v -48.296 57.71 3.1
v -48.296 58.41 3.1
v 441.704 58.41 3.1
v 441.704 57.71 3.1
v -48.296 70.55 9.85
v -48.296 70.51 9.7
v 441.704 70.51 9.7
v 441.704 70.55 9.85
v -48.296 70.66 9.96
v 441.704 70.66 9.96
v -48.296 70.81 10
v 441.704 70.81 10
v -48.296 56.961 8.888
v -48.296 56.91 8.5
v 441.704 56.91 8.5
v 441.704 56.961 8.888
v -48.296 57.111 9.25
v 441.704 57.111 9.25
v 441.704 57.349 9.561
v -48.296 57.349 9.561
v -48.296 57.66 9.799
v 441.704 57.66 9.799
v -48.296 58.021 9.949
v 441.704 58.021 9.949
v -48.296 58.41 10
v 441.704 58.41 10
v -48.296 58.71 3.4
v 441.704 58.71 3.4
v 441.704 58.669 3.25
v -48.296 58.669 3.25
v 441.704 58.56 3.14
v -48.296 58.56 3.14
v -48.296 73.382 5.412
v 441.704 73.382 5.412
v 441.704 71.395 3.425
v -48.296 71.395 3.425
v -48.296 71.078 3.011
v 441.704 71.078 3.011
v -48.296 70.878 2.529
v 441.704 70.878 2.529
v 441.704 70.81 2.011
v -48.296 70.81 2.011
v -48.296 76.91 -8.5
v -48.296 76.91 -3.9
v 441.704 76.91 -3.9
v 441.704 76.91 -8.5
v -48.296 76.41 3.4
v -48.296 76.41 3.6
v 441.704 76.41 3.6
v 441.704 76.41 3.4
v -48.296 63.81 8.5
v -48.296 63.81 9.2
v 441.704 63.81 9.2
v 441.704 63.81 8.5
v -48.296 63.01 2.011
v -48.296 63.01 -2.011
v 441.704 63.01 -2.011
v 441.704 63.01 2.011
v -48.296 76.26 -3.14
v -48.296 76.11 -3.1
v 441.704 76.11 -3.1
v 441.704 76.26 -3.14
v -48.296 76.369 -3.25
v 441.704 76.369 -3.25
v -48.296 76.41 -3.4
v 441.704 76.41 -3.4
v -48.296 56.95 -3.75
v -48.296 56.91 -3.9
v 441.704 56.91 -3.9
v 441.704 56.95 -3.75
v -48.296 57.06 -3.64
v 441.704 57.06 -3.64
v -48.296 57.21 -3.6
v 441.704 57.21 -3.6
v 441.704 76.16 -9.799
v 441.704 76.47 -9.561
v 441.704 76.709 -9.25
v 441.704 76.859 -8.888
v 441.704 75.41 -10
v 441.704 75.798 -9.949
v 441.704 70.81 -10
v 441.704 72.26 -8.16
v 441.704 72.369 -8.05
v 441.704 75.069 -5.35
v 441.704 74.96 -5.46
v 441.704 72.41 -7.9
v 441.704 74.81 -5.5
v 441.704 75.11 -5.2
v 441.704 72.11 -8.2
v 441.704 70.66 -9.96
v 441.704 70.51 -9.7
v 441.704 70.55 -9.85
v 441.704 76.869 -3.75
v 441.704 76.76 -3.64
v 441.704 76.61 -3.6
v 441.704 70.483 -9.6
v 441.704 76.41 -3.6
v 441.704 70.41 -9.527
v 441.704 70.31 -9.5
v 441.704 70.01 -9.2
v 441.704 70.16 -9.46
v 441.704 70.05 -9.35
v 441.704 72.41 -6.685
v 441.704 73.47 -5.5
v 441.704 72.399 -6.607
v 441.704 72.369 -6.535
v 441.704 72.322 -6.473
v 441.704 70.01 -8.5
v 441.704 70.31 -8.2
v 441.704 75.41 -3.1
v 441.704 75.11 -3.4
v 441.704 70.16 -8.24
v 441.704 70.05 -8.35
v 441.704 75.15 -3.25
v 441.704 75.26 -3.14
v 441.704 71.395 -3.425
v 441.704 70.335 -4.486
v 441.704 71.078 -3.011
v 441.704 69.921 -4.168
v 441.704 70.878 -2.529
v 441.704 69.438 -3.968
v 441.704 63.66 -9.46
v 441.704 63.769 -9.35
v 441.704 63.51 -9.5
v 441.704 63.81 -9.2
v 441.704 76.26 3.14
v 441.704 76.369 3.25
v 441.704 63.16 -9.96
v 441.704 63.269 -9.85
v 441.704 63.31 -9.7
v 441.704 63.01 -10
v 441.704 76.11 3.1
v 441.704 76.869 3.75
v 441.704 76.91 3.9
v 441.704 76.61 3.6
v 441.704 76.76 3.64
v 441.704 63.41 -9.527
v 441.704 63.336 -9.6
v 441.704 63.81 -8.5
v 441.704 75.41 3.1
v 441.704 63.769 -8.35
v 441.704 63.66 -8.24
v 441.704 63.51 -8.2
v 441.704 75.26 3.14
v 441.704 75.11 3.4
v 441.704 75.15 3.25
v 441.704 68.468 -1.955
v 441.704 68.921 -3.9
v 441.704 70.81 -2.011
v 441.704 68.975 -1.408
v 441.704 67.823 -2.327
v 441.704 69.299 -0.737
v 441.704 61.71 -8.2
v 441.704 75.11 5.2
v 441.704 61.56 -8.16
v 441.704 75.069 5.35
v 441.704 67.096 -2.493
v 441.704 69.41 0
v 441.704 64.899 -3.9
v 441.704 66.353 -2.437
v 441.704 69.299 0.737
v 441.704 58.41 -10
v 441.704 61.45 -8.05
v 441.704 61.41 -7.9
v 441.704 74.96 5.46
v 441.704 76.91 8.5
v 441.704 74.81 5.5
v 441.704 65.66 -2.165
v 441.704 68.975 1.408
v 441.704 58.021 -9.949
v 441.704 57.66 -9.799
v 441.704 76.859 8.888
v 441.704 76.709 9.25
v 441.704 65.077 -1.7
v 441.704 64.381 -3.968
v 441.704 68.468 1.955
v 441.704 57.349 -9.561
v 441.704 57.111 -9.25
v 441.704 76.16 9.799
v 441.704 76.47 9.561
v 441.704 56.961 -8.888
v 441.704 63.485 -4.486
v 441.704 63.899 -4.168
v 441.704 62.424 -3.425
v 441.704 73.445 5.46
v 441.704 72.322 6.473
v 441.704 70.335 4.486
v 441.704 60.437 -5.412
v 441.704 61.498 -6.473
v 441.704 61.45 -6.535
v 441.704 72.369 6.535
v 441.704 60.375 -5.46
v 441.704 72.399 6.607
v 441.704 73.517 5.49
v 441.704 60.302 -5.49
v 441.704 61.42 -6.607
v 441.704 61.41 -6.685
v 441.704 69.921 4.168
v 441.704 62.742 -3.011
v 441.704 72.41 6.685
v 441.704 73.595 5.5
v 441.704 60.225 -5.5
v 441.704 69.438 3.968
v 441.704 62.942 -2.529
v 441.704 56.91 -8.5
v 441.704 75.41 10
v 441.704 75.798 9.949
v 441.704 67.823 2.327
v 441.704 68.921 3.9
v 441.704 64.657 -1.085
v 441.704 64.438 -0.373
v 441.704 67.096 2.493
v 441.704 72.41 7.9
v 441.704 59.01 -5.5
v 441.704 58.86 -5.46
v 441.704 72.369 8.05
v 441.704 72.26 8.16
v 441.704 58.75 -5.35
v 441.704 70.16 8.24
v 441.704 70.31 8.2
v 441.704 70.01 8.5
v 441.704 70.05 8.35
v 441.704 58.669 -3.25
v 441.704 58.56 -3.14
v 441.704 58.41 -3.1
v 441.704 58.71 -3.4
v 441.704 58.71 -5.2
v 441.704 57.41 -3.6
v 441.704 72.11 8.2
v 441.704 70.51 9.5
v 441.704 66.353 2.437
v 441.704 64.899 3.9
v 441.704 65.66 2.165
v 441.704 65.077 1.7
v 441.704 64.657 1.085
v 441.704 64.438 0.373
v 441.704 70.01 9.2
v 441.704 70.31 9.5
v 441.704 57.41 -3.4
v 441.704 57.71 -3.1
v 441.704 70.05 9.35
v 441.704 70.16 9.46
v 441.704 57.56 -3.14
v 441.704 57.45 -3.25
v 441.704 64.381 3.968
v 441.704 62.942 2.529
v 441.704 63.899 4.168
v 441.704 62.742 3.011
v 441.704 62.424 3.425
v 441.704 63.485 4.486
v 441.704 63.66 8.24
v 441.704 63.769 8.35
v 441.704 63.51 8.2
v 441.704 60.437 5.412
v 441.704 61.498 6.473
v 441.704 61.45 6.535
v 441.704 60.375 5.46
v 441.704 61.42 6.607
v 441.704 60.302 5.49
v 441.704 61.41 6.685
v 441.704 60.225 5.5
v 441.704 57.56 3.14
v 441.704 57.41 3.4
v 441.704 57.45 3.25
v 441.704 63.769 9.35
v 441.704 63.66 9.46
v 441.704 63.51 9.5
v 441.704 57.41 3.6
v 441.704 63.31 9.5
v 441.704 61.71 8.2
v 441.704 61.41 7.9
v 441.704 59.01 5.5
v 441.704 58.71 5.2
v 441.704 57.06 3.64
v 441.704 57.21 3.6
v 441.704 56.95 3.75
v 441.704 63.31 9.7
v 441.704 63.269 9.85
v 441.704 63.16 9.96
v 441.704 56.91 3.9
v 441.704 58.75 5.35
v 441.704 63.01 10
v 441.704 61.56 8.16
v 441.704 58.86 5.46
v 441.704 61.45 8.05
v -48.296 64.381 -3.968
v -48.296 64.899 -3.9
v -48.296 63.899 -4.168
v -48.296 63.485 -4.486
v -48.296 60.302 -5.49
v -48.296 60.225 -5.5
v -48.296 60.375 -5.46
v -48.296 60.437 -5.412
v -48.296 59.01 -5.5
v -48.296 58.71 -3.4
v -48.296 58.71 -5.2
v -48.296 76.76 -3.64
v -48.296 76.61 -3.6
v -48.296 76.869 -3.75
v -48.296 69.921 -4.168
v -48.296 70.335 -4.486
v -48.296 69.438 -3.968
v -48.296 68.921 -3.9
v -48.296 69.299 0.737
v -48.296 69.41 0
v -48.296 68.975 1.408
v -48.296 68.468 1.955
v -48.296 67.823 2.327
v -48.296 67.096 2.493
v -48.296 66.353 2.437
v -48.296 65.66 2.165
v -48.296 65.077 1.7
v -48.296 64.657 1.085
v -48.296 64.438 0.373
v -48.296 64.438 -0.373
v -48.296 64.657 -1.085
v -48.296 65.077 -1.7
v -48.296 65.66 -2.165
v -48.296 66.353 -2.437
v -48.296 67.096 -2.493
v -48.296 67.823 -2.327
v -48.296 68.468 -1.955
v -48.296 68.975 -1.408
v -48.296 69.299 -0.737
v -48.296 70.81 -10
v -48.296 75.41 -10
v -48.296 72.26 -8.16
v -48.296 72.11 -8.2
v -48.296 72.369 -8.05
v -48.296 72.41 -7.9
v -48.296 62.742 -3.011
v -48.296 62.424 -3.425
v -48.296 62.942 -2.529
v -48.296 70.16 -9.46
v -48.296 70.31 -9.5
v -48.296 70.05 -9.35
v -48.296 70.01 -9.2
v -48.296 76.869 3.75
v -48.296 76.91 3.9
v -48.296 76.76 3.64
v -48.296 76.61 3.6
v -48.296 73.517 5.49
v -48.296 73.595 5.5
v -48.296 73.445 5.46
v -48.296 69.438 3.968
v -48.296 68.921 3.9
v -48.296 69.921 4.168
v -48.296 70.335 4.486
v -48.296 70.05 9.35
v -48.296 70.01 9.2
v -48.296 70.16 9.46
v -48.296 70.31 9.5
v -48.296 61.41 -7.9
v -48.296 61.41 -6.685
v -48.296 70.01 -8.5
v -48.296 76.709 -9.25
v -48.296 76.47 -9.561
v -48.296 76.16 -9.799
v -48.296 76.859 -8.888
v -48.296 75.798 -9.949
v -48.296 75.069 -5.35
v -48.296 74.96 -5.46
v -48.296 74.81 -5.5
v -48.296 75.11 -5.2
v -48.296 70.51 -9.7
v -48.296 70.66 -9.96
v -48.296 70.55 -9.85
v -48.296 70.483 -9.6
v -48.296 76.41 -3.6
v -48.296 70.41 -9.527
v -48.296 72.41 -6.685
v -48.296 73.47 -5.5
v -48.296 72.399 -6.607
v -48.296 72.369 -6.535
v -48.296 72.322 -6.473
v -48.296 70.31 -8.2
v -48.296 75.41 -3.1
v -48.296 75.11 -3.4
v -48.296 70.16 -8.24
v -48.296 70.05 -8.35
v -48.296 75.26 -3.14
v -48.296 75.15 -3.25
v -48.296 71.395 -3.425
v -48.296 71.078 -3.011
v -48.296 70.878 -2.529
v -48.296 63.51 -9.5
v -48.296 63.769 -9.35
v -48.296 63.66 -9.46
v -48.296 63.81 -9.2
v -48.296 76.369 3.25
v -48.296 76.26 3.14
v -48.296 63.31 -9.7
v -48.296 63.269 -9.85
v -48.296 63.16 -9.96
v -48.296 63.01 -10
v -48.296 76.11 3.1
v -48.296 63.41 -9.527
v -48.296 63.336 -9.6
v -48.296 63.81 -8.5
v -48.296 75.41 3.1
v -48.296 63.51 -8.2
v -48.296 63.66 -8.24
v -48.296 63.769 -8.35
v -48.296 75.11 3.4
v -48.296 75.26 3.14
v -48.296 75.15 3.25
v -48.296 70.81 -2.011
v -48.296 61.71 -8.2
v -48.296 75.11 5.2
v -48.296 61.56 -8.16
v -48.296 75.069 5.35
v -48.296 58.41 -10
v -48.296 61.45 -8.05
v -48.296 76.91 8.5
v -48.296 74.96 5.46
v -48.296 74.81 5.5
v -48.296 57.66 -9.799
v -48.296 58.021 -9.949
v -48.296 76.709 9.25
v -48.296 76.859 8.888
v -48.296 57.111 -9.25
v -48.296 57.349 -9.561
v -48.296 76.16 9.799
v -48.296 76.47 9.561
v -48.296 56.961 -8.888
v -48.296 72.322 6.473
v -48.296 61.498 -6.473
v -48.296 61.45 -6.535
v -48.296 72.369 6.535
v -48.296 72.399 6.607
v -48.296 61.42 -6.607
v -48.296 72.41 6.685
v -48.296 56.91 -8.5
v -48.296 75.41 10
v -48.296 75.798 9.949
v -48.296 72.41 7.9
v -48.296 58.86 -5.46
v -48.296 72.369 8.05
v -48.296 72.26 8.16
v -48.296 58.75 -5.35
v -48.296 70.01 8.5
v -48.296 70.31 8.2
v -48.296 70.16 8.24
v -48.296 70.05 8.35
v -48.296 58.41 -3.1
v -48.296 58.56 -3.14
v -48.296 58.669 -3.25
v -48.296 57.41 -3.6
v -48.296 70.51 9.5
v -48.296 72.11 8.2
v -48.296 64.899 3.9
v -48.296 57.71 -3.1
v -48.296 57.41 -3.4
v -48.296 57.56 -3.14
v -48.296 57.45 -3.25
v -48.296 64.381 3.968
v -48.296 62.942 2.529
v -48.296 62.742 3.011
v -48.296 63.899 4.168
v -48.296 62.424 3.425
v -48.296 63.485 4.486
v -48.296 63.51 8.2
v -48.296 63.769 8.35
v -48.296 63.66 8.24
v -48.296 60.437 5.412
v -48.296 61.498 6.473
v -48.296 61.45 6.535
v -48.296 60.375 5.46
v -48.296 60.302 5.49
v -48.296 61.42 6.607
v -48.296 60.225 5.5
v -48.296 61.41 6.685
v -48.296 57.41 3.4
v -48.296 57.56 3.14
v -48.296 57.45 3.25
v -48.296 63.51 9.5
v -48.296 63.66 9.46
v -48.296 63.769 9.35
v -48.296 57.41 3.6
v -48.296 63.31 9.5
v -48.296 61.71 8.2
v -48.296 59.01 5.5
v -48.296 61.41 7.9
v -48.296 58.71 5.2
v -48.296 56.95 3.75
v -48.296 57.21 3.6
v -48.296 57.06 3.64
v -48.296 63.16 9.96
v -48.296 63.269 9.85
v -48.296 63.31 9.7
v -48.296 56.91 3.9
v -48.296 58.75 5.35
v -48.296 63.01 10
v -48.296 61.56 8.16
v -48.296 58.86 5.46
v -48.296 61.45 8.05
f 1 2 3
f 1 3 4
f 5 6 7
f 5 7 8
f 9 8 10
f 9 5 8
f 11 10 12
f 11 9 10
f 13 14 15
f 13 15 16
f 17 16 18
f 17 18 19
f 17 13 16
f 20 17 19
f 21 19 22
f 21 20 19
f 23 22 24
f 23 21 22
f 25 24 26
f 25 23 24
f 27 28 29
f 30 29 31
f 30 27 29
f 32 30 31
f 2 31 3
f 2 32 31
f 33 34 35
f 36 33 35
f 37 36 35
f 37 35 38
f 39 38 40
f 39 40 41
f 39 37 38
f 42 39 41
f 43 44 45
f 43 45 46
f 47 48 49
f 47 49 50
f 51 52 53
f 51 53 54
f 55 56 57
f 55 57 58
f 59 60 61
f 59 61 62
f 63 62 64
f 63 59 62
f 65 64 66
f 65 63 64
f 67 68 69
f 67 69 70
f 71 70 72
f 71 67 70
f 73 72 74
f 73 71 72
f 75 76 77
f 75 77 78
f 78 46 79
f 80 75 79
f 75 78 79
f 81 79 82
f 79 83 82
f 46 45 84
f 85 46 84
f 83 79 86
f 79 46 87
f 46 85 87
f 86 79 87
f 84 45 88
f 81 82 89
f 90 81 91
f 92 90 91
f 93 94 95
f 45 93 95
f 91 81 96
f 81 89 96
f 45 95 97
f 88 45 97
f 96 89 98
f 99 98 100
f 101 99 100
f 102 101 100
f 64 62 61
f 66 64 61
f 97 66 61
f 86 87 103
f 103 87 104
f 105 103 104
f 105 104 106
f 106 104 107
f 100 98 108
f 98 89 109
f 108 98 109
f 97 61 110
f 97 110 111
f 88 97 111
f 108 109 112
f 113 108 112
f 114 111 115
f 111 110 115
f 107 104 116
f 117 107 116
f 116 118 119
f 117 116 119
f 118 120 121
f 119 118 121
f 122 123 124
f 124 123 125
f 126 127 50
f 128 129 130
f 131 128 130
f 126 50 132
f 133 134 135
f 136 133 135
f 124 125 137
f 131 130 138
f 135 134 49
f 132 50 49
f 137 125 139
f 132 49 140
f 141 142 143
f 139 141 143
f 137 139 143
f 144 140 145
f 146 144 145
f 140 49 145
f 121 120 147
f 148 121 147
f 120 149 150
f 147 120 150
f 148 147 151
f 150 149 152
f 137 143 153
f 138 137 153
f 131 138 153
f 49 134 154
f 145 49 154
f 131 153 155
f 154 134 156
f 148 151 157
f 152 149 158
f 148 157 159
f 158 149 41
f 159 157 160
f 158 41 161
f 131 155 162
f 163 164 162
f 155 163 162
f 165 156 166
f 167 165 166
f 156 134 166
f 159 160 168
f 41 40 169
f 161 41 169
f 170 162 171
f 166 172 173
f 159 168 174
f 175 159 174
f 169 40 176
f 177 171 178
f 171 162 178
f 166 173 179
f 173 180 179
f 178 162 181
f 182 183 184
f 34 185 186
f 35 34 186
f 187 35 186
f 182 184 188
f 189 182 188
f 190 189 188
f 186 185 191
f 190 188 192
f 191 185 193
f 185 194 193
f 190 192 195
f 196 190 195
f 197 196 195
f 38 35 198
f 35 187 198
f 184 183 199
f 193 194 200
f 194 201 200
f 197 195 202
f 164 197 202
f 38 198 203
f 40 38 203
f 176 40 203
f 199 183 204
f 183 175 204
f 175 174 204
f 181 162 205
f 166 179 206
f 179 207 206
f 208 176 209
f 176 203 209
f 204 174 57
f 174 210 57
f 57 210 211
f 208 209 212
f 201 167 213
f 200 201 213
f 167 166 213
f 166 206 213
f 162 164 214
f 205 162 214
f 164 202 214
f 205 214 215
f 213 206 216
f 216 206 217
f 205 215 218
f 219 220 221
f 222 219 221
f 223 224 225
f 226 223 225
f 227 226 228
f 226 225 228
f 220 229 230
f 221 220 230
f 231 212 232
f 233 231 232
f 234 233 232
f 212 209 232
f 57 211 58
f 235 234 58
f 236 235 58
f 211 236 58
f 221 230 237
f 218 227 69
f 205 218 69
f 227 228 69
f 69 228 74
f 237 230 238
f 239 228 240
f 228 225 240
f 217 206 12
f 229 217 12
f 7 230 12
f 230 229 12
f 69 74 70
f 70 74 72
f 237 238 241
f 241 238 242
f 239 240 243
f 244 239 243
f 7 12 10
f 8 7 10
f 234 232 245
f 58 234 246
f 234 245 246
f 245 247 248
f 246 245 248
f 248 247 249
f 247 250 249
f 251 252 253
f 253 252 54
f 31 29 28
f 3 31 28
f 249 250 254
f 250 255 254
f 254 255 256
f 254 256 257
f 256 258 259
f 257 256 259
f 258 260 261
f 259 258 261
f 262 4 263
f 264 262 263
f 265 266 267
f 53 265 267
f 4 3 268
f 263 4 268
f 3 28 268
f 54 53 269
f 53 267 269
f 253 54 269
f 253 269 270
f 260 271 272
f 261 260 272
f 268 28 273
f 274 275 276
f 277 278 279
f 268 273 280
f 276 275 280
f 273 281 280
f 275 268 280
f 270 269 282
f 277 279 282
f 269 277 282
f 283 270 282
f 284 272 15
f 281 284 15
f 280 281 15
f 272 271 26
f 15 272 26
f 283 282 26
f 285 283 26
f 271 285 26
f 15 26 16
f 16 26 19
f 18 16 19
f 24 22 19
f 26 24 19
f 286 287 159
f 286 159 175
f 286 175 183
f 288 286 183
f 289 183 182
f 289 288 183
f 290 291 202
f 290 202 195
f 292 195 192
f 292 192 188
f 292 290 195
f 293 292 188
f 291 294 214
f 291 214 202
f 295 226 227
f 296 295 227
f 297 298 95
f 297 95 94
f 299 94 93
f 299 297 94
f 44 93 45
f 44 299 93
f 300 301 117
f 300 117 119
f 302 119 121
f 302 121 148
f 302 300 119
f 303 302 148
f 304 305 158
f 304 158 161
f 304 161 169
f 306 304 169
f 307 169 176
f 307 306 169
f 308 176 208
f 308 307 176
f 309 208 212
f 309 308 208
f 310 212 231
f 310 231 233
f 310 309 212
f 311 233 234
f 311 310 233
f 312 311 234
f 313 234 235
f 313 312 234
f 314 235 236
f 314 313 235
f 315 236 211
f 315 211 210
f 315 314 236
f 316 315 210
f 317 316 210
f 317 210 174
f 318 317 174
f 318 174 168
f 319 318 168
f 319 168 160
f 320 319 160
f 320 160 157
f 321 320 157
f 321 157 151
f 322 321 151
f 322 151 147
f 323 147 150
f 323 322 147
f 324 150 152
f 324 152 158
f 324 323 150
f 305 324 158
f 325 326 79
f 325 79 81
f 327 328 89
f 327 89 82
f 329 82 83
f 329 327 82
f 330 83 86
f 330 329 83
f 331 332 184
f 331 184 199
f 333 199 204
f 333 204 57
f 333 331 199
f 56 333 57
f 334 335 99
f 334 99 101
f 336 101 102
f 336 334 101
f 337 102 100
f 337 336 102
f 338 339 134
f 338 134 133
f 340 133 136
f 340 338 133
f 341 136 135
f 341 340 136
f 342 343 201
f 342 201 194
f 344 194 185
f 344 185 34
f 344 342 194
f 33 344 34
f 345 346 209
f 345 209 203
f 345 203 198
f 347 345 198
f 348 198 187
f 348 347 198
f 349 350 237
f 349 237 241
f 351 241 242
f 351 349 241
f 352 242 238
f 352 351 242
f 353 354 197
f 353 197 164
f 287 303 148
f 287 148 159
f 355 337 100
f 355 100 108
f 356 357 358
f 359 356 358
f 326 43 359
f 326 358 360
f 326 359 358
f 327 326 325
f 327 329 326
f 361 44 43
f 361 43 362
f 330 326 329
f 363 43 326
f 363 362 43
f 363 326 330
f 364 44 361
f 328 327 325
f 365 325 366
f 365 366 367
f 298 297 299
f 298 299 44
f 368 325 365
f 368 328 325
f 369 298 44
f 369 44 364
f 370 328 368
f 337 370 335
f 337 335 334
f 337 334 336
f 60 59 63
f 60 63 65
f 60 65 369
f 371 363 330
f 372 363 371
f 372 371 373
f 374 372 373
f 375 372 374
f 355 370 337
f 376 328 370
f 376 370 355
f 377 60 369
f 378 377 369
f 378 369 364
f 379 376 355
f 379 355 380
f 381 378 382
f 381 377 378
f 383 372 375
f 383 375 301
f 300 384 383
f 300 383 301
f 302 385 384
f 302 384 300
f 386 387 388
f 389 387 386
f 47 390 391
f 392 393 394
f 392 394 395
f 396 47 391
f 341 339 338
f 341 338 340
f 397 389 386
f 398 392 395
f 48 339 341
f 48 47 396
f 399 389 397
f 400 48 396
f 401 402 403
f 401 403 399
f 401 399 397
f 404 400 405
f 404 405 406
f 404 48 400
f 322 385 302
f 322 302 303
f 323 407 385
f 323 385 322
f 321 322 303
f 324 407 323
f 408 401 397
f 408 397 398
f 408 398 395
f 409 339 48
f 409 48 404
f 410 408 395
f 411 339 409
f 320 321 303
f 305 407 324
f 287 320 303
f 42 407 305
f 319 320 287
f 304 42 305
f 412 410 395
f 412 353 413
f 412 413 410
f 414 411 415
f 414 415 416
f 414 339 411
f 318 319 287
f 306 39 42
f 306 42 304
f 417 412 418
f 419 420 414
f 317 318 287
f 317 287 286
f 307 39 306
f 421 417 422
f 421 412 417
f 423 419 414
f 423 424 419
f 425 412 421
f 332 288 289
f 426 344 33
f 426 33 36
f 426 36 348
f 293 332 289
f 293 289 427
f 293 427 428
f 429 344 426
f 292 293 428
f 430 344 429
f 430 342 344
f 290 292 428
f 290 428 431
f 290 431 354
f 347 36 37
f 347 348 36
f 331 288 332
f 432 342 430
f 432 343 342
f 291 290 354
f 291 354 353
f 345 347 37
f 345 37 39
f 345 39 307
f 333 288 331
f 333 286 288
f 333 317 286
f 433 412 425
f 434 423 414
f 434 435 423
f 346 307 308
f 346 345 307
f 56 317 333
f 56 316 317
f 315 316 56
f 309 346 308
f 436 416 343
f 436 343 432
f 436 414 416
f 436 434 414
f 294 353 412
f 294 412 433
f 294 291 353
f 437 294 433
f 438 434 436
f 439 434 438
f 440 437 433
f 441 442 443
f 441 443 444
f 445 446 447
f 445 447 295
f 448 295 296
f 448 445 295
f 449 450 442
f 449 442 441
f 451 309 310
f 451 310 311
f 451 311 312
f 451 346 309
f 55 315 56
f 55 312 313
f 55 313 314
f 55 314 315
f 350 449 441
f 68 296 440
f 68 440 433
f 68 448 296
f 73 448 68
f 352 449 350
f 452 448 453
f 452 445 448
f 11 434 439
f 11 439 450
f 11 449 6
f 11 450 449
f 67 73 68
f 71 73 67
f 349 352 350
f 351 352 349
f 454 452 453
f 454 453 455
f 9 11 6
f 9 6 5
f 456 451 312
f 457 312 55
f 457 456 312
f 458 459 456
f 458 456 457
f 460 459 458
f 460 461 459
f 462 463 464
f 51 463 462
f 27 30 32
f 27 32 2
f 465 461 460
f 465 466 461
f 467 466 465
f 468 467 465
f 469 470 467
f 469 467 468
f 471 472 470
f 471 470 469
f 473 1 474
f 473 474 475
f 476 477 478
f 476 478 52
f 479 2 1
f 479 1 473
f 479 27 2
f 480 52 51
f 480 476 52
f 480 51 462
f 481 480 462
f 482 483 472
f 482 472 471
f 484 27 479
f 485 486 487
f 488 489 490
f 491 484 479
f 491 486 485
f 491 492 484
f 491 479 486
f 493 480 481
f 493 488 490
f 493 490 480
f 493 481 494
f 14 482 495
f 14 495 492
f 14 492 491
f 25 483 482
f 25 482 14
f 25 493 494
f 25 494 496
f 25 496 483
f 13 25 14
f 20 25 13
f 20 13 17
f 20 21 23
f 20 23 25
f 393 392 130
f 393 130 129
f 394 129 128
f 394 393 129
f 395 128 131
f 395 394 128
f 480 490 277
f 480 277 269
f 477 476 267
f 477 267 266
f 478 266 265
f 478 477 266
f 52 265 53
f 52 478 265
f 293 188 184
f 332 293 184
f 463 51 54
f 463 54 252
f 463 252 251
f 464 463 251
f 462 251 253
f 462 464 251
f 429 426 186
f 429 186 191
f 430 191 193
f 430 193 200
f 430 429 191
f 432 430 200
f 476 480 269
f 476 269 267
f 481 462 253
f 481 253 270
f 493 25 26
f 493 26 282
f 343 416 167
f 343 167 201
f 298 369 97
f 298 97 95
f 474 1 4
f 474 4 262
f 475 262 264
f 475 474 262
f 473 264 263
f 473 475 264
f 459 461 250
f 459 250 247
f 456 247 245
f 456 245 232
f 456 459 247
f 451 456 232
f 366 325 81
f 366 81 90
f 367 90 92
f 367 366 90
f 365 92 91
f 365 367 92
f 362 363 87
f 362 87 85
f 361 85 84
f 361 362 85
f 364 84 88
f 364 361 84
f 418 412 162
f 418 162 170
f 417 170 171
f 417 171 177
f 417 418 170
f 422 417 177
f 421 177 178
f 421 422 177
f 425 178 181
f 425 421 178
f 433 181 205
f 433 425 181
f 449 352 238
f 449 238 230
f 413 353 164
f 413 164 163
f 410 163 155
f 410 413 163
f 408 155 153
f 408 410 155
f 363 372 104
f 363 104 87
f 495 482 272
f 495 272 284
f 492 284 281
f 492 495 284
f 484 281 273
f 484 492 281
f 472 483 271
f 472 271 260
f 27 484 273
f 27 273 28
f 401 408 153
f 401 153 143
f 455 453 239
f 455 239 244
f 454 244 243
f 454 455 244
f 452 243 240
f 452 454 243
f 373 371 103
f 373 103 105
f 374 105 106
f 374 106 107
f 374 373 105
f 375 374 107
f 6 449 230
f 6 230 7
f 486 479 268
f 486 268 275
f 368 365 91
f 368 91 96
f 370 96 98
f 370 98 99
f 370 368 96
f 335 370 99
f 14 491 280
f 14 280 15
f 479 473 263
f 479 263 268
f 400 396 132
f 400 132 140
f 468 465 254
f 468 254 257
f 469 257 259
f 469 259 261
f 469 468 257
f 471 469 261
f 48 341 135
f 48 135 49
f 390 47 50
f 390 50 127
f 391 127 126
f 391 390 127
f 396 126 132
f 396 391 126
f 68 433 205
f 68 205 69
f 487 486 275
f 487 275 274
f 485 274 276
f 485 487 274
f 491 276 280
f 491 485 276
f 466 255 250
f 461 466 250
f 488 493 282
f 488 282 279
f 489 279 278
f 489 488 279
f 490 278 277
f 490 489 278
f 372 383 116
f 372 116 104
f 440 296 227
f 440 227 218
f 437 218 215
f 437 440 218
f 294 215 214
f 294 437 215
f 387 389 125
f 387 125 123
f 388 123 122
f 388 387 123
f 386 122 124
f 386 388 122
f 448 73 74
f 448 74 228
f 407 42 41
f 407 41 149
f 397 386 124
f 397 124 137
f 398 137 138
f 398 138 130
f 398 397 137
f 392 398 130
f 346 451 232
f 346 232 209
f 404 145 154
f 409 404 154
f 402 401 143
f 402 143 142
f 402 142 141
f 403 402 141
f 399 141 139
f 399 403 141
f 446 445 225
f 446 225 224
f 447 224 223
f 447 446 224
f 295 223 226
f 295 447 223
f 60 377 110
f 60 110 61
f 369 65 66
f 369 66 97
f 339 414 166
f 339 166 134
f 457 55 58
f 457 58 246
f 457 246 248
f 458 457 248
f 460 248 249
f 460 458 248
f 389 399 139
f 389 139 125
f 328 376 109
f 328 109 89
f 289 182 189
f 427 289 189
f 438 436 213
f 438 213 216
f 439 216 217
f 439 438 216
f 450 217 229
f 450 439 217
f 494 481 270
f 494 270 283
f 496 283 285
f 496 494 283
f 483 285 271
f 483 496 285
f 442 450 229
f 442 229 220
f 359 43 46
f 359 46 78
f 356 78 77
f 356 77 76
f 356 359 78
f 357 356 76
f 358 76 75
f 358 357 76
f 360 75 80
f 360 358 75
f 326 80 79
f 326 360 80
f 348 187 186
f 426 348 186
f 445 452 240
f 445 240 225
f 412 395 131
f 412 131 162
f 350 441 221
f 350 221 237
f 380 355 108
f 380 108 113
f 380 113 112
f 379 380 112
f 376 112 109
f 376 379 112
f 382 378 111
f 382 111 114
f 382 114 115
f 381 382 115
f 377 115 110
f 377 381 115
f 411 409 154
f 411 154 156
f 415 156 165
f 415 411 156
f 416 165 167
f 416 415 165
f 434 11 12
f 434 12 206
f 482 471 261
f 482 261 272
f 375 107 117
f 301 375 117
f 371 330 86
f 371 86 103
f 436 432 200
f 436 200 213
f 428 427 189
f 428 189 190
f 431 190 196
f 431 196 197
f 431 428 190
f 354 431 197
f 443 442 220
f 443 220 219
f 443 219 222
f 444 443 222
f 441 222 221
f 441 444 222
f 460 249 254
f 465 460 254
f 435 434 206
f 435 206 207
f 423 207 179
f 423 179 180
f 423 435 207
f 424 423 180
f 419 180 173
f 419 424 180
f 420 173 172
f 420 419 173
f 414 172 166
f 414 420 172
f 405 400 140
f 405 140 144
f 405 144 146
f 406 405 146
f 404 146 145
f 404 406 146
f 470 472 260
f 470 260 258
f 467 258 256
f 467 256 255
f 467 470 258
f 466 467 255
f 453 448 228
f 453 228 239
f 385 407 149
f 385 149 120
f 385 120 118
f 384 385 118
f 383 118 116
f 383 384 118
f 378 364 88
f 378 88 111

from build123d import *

# Parameters (mm, degrees)
SKETCH_11_R         = 2.5
MEMBER_2020_1_DEPTH = 490


with BuildPart() as part:
    # 草图11 → Member 2020_1 (new body)
    with BuildSketch(Plane(origin=(-48.295687885, 66.909650924, 0), x_dir=(0, 1, 0), z_dir=(1, 0, 0))):
        with BuildLine():
            Line((3.9, 0), (3.9, -2.010912703))
            ThreePointArc((3.9, -2.010912703), (4.052240935, -2.776279568), (4.485786438, -3.425126266))
            Line((4.485786438, -3.425126266), (6.560660172, -5.5))
            Line((6.560660172, -5.5), (7.9, -5.5))
            ThreePointArc((7.9, -5.5), (8.112132034, -5.412132034), (8.2, -5.2))
            Line((8.2, -5.2), (8.2, -3.4))
            ThreePointArc((8.2, -3.4), (8.287867966, -3.187867966), (8.5, -3.1))
            Line((8.5, -3.1), (9.2, -3.1))
            ThreePointArc((9.2, -3.1), (9.412132034, -3.187867966), (9.5, -3.4))
            Line((9.5, -3.4), (9.5, -3.6))
            Line((9.5, -3.6), (9.7, -3.6))
            ThreePointArc((9.7, -3.6), (9.912132034, -3.687867966), (10, -3.9))
            Line((10, -3.9), (10, -8.5))
            ThreePointArc((10, -8.5), (9.560660172, -9.560660172), (8.5, -10))
            Line((8.5, -10), (3.9, -10))
            ThreePointArc((3.9, -10), (3.687867966, -9.912132034), (3.6, -9.7))
            ThreePointArc((3.6, -9.7), (3.541421356, -9.558578644), (3.4, -9.5))
            ThreePointArc((3.4, -9.5), (3.187867966, -9.412132034), (3.1, -9.2))
            Line((3.1, -9.2), (3.1, -8.5))
            ThreePointArc((3.1, -8.5), (3.187867966, -8.287867966), (3.4, -8.2))
            Line((3.4, -8.2), (5.2, -8.2))
            ThreePointArc((5.2, -8.2), (5.412132034, -8.112132034), (5.5, -7.9))
            Line((5.5, -7.9), (5.5, -6.68492424))
            ThreePointArc((5.5, -6.68492424), (5.47716386, -6.570119211), (5.412132034, -6.472792206))
            Line((5.412132034, -6.472792206), (3.425126266, -4.485786438))
            ThreePointArc((3.425126266, -4.485786438), (2.776279568, -4.052240935), (2.010912703, -3.9))
            Line((2.010912703, -3.9), (0, -3.9))
            Line((0, -3.9), (-2.010912703, -3.9))
            ThreePointArc((-2.010912703, -3.9), (-2.776279568, -4.052240935), (-3.425126266, -4.485786438))
            Line((-3.425126266, -4.485786438), (-5.412132034, -6.472792206))
            ThreePointArc((-5.412132034, -6.472792206), (-5.47716386, -6.570119211), (-5.5, -6.68492424))
            Line((-5.5, -6.68492424), (-5.5, -7.9))
            ThreePointArc((-5.5, -7.9), (-5.412132034, -8.112132034), (-5.2, -8.2))
            Line((-5.2, -8.2), (-3.4, -8.2))
            ThreePointArc((-3.4, -8.2), (-3.187867966, -8.287867966), (-3.1, -8.5))
            Line((-3.1, -8.5), (-3.1, -9.2))
            ThreePointArc((-3.1, -9.2), (-3.187867966, -9.412132034), (-3.4, -9.5))
            ThreePointArc((-3.4, -9.5), (-3.541421356, -9.558578644), (-3.6, -9.7))
            ThreePointArc((-3.6, -9.7), (-3.687867966, -9.912132034), (-3.9, -10))
            Line((-3.9, -10), (-8.5, -10))
            ThreePointArc((-8.5, -10), (-9.560660172, -9.560660172), (-10, -8.5))
            Line((-10, -8.5), (-10, -3.9))
            ThreePointArc((-10, -3.9), (-9.912132034, -3.687867966), (-9.7, -3.6))
            Line((-9.7, -3.6), (-9.5, -3.6))
            Line((-9.5, -3.6), (-9.5, -3.4))
            ThreePointArc((-9.5, -3.4), (-9.412132034, -3.187867966), (-9.2, -3.1))
            Line((-9.2, -3.1), (-8.5, -3.1))
            ThreePointArc((-8.5, -3.1), (-8.287867965, -3.187867966), (-8.2, -3.4))
            Line((-8.2, -3.4), (-8.2, -5.2))
            ThreePointArc((-8.2, -5.2), (-8.112132034, -5.412132034), (-7.9, -5.5))
            Line((-7.9, -5.5), (-6.68492424, -5.5))
            ThreePointArc((-6.68492424, -5.5), (-6.570119211, -5.47716386), (-6.472792206, -5.412132034))
            Line((-6.472792206, -5.412132034), (-4.485786438, -3.425126266))
            ThreePointArc((-4.485786438, -3.425126266), (-4.052240935, -2.776279568), (-3.9, -2.010912703))
            Line((-3.9, -2.010912703), (-3.9, 0))
            Line((-3.9, 0), (-3.9, 2.010912703))
            ThreePointArc((-3.9, 2.010912703), (-4.052240935, 2.776279568), (-4.485786438, 3.425126266))
            Line((-4.485786438, 3.425126266), (-6.472792206, 5.412132034))
            ThreePointArc((-6.472792206, 5.412132034), (-6.570119211, 5.47716386), (-6.68492424, 5.5))
            Line((-6.68492424, 5.5), (-7.9, 5.5))
            ThreePointArc((-7.9, 5.5), (-8.112132034, 5.412132034), (-8.2, 5.2))
            Line((-8.2, 5.2), (-8.2, 3.4))
            ThreePointArc((-8.2, 3.4), (-8.287867965, 3.187867966), (-8.5, 3.1))
            Line((-8.5, 3.1), (-9.2, 3.1))
            ThreePointArc((-9.2, 3.1), (-9.412132034, 3.187867966), (-9.5, 3.4))
            Line((-9.5, 3.4), (-9.5, 3.6))
            Line((-9.5, 3.6), (-9.7, 3.6))
            ThreePointArc((-9.7, 3.6), (-9.912132034, 3.687867966), (-10, 3.9))
            Line((-10, 3.9), (-10, 8.5))
            ThreePointArc((-10, 8.5), (-9.560660172, 9.560660172), (-8.5, 10))
            Line((-8.5, 10), (-3.9, 10))
            ThreePointArc((-3.9, 10), (-3.687867966, 9.912132034), (-3.6, 9.7))
            Line((-3.6, 9.7), (-3.6, 9.5))
            Line((-3.6, 9.5), (-3.4, 9.5))
            ThreePointArc((-3.4, 9.5), (-3.187867966, 9.412132034), (-3.1, 9.2))
            Line((-3.1, 9.2), (-3.1, 8.5))
            ThreePointArc((-3.1, 8.5), (-3.187867966, 8.287867966), (-3.4, 8.2))
            Line((-3.4, 8.2), (-5.2, 8.2))
            ThreePointArc((-5.2, 8.2), (-5.412132034, 8.112132034), (-5.5, 7.9))
            Line((-5.5, 7.9), (-5.5, 6.68492424))
            ThreePointArc((-5.5, 6.68492424), (-5.47716386, 6.570119211), (-5.412132034, 6.472792206))
            Line((-5.412132034, 6.472792206), (-3.425126266, 4.485786438))
            ThreePointArc((-3.425126266, 4.485786438), (-2.776279568, 4.052240935), (-2.010912703, 3.9))
            Line((-2.010912703, 3.9), (0, 3.9))
            Line((0, 3.9), (2.010912703, 3.9))
            ThreePointArc((2.010912703, 3.9), (2.776279568, 4.052240935), (3.425126266, 4.485786438))
            Line((3.425126266, 4.485786438), (5.412132034, 6.472792206))
            ThreePointArc((5.412132034, 6.472792206), (5.47716386, 6.570119211), (5.5, 6.68492424))
            Line((5.5, 6.68492424), (5.5, 7.9))
            ThreePointArc((5.5, 7.9), (5.412132034, 8.112132034), (5.2, 8.2))
            Line((5.2, 8.2), (3.4, 8.2))
            ThreePointArc((3.4, 8.2), (3.187867966, 8.287867966), (3.1, 8.5))
            Line((3.1, 8.5), (3.1, 9.2))
            ThreePointArc((3.1, 9.2), (3.187867966, 9.412132034), (3.4, 9.5))
            Line((3.4, 9.5), (3.6, 9.5))
            Line((3.6, 9.5), (3.6, 9.7))
            ThreePointArc((3.6, 9.7), (3.687867966, 9.912132034), (3.9, 10))
            Line((3.9, 10), (8.5, 10))
            ThreePointArc((8.5, 10), (9.560660172, 9.560660172), (10, 8.5))
            Line((10, 8.5), (10, 3.9))
            ThreePointArc((10, 3.9), (9.912132034, 3.687867966), (9.7, 3.6))
            Line((9.7, 3.6), (9.5, 3.6))
            Line((9.5, 3.6), (9.5, 3.4))
            ThreePointArc((9.5, 3.4), (9.412132034, 3.187867966), (9.2, 3.1))
            Line((9.2, 3.1), (8.5, 3.1))
            ThreePointArc((8.5, 3.1), (8.287867966, 3.187867966), (8.2, 3.4))
            Line((8.2, 3.4), (8.2, 5.2))
            ThreePointArc((8.2, 5.2), (8.112132034, 5.412132034), (7.9, 5.5))
            Line((7.9, 5.5), (6.68492424, 5.5))
            ThreePointArc((6.68492424, 5.5), (6.570119211, 5.47716386), (6.472792206, 5.412132034))
            Line((6.472792206, 5.412132034), (4.485786438, 3.425126266))
            ThreePointArc((4.485786438, 3.425126266), (4.052240935, 2.776279568), (3.9, 2.010912703))
            Line((3.9, 2.010912703), (3.9, 0))
        make_face()
        Circle(SKETCH_11_R, mode=Mode.SUBTRACT)
    extrude(amount=MEMBER_2020_1_DEPTH)


solid = part.part
